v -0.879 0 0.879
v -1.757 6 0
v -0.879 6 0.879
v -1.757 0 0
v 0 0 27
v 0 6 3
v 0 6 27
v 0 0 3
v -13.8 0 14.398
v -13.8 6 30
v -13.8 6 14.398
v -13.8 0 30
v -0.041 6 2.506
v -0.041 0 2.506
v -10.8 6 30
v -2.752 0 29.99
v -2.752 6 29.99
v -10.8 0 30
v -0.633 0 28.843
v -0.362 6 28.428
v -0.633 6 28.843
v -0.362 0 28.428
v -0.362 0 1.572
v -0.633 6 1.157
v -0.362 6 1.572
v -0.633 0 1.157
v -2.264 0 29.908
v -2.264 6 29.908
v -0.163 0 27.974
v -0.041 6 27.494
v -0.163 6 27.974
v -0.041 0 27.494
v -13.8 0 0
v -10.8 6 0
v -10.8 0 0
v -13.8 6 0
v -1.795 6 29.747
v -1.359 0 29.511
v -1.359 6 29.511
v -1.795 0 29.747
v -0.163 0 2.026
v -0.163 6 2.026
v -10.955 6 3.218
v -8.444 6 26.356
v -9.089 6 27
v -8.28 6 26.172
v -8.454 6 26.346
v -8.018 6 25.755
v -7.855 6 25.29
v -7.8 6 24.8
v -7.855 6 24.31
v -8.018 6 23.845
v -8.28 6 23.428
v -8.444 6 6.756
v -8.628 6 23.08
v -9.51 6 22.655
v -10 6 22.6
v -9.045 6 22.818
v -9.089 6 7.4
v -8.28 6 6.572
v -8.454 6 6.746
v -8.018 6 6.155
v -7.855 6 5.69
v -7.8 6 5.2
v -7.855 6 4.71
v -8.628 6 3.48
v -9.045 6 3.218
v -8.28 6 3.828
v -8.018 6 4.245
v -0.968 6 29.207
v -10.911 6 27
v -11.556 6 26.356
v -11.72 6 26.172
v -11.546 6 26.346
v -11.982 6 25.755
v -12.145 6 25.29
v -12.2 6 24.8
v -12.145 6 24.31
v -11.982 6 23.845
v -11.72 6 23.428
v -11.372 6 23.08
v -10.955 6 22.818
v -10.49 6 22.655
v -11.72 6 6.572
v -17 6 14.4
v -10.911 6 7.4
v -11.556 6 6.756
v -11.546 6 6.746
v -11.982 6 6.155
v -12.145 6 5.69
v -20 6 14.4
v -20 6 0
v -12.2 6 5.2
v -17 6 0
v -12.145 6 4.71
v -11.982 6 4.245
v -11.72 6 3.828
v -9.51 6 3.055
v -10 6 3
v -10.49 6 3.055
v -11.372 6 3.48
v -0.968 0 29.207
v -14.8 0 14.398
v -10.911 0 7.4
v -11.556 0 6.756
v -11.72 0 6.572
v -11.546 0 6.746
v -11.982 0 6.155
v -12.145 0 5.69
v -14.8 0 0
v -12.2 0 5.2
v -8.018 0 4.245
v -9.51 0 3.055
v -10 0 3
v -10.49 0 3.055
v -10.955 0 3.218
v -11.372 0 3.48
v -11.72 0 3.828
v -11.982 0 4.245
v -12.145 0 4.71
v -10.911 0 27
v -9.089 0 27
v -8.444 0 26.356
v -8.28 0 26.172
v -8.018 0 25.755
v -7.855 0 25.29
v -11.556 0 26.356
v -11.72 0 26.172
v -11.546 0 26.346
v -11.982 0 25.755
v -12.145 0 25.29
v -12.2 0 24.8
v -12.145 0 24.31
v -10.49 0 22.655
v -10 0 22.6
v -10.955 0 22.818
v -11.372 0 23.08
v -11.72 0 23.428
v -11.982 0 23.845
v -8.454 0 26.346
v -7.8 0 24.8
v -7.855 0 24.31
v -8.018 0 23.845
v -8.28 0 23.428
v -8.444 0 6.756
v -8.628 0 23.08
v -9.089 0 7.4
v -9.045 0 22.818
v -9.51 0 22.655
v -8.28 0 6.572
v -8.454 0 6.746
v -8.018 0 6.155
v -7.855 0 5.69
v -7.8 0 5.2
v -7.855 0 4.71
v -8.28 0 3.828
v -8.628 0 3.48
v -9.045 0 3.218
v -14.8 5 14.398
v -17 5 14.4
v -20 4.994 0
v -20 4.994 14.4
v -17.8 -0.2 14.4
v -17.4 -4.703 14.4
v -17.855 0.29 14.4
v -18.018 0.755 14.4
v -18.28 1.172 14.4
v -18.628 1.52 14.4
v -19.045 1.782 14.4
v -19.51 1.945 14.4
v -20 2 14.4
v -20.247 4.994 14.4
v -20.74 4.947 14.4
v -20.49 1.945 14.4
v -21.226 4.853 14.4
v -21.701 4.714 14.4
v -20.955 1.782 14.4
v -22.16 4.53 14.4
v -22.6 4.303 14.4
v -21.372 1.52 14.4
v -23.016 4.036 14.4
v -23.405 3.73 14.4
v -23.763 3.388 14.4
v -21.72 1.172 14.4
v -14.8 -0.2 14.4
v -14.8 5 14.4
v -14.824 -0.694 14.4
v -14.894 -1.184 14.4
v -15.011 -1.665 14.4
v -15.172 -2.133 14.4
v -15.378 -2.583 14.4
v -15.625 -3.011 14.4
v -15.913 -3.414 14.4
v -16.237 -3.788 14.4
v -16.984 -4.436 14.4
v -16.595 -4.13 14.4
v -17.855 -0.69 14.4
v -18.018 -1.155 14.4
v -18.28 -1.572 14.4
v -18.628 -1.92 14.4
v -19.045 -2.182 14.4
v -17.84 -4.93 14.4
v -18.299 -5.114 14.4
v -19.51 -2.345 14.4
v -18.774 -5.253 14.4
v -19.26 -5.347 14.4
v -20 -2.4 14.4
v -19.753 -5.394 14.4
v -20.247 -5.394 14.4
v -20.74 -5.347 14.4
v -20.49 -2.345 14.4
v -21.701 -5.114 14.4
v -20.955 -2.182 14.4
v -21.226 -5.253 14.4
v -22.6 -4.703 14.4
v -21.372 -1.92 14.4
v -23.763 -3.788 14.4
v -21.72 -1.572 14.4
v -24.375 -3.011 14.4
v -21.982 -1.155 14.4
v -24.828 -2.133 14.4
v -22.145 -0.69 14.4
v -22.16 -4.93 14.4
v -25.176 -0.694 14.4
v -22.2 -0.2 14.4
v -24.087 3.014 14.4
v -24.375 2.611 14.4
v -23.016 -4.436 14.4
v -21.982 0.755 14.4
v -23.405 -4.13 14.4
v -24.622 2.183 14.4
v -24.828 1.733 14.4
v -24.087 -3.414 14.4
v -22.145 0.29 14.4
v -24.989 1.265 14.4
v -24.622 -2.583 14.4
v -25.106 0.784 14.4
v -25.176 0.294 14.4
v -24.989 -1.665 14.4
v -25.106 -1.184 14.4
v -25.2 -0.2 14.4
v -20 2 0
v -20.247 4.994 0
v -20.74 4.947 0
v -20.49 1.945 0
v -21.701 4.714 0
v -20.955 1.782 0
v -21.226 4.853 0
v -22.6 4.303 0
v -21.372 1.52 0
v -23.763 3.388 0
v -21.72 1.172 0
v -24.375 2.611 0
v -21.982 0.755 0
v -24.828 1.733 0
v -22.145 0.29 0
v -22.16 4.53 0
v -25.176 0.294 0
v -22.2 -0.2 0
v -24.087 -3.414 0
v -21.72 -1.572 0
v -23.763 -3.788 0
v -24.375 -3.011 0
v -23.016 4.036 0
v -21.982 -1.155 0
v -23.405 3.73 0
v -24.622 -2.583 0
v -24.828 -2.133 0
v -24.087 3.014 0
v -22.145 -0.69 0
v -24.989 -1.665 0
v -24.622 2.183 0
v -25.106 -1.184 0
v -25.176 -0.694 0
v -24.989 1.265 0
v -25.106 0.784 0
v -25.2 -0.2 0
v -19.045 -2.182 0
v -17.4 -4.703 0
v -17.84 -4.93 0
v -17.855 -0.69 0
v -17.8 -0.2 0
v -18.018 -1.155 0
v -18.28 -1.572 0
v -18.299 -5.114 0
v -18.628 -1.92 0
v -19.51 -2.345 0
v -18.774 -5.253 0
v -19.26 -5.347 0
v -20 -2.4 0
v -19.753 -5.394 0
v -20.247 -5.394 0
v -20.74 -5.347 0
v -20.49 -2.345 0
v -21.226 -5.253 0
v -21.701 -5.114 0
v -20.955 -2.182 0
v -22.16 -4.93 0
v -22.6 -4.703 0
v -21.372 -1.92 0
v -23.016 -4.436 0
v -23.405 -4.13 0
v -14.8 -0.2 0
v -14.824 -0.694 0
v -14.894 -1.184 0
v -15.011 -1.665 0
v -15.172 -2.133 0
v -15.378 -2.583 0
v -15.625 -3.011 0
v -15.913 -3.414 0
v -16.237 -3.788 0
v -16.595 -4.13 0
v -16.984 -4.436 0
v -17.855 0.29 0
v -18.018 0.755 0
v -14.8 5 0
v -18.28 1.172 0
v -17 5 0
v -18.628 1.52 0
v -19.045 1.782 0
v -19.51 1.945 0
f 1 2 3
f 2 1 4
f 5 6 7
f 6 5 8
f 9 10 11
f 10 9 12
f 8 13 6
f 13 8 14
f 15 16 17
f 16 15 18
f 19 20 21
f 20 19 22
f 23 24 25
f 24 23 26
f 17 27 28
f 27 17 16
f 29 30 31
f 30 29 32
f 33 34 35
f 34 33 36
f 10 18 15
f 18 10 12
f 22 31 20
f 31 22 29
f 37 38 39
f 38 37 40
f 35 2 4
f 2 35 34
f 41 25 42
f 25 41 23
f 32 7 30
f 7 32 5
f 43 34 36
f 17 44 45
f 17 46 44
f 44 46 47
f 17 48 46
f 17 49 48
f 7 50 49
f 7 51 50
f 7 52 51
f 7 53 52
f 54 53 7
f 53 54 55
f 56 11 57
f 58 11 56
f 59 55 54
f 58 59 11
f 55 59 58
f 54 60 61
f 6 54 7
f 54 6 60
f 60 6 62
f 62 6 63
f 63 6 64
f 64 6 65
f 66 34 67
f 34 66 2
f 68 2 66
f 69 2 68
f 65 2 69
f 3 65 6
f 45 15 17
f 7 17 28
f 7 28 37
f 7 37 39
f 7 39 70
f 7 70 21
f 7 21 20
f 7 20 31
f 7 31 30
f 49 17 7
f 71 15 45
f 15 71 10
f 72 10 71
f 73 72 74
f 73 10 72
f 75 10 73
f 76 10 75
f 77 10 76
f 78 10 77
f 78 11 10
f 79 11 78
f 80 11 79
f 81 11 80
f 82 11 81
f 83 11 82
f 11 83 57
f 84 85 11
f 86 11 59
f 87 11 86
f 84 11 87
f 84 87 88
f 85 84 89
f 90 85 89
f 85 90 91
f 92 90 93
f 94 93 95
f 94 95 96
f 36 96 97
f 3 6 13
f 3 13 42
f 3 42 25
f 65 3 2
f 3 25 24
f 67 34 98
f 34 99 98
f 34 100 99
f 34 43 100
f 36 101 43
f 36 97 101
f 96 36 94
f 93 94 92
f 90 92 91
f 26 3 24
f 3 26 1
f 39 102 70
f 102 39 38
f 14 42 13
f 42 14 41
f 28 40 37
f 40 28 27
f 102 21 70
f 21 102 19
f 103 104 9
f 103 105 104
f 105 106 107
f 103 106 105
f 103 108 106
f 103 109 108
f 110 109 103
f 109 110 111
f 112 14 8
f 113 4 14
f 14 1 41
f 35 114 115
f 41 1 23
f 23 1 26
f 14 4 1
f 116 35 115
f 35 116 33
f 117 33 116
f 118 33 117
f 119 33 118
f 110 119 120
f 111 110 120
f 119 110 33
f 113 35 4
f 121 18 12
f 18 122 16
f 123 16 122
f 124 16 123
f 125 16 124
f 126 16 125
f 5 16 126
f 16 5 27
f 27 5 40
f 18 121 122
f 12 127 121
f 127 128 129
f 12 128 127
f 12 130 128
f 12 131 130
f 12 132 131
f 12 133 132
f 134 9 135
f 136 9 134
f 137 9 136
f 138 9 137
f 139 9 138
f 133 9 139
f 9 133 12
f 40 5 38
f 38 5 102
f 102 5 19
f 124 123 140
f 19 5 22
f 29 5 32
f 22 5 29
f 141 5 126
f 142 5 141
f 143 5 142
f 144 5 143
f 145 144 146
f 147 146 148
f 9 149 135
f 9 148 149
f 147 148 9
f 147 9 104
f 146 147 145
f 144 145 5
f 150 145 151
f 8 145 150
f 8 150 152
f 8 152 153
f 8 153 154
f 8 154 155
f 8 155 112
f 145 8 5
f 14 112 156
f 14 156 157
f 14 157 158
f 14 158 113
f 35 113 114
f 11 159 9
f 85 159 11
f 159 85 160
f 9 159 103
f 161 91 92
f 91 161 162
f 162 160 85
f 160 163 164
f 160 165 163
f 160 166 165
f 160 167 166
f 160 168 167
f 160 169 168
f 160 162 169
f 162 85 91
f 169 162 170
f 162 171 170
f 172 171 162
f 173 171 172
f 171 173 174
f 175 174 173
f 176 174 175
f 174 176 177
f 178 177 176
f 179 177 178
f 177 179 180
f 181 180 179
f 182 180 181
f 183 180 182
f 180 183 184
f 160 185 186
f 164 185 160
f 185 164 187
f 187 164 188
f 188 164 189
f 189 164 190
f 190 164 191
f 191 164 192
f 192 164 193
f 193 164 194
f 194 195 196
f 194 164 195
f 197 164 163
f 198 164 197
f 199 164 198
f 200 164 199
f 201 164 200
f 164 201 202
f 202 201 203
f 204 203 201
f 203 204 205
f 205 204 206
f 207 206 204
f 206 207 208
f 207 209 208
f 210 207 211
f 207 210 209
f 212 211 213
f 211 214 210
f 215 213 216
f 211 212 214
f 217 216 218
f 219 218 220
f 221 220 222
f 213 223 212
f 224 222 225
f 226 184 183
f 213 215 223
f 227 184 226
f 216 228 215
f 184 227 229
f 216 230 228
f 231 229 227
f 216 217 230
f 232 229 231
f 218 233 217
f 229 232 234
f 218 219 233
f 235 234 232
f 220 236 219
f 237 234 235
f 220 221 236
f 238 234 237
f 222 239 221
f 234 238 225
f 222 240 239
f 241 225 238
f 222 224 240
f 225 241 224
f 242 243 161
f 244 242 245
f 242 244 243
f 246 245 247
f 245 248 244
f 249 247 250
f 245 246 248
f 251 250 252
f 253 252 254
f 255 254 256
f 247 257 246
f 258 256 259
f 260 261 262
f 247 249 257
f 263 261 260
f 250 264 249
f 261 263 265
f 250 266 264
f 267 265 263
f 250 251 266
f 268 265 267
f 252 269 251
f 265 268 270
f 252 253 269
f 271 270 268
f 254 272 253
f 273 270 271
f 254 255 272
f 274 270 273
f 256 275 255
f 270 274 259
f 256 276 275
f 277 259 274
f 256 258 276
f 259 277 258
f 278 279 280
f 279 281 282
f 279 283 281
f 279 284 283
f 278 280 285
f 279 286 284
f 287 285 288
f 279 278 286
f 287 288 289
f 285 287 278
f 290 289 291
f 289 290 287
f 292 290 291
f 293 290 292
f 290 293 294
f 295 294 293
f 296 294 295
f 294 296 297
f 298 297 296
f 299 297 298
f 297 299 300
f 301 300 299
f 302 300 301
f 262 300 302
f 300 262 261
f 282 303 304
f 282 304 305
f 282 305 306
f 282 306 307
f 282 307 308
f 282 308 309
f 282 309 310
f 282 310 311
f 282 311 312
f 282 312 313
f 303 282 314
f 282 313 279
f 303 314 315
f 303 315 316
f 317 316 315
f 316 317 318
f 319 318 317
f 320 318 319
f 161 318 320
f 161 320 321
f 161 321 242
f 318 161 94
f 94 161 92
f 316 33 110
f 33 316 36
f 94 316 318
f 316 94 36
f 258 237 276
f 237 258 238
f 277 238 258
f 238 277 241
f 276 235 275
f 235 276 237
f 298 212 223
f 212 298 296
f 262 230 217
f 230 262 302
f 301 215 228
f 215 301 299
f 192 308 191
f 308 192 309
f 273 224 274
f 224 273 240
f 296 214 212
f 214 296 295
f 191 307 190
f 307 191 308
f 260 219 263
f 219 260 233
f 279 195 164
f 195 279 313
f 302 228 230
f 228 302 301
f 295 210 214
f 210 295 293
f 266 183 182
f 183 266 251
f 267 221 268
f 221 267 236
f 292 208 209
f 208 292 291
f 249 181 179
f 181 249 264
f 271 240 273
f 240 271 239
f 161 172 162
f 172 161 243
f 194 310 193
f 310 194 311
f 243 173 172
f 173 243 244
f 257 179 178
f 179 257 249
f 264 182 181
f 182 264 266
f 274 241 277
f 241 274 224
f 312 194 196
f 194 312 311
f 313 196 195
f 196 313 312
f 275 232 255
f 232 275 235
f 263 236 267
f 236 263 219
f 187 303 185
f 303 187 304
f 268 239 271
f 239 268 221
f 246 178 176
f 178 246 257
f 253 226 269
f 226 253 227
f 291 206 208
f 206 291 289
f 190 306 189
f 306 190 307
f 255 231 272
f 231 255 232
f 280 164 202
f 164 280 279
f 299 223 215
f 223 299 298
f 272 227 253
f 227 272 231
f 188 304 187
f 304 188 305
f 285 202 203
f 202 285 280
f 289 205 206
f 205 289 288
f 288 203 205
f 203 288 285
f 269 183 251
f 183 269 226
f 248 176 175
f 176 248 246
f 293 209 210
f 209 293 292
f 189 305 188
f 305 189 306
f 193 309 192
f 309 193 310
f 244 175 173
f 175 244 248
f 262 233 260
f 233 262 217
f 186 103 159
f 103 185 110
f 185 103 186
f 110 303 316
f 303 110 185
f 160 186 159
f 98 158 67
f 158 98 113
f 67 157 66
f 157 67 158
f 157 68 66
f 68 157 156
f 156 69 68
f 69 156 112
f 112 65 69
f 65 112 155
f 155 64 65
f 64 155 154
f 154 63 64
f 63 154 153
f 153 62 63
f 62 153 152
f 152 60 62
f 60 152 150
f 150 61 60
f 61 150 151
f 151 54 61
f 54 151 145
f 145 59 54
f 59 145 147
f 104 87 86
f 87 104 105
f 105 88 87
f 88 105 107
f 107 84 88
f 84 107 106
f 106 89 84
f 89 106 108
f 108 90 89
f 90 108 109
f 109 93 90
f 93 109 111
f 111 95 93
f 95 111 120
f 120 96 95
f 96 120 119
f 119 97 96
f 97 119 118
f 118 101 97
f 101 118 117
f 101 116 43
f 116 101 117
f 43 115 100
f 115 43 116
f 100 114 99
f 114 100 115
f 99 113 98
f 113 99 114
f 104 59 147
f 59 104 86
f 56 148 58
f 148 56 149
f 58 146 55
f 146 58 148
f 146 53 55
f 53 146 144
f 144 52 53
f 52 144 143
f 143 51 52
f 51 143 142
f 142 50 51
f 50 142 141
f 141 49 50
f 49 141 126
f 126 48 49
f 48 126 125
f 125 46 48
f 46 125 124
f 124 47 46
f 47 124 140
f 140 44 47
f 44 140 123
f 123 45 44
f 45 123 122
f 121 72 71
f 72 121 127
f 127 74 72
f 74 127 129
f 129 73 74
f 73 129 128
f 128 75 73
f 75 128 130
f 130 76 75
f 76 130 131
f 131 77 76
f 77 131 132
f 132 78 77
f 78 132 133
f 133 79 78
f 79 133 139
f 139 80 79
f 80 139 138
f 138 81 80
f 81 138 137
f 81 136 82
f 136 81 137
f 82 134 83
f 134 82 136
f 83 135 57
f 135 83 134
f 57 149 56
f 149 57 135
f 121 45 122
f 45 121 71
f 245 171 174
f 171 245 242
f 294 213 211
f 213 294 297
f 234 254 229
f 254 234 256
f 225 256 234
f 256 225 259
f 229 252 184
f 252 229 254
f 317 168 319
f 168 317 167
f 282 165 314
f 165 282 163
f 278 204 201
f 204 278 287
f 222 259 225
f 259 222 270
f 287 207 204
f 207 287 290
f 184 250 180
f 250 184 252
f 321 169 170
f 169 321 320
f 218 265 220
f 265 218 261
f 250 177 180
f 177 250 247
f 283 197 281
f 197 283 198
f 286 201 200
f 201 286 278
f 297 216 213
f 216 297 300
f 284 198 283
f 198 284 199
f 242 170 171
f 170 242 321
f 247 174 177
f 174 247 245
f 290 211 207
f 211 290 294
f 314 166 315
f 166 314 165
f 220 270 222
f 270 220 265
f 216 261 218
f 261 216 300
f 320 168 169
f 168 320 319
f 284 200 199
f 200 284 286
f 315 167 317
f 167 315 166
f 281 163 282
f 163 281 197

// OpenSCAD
// file: functions.scad
/*******************************************************************

This OpenSCAD code and its rendered 3D model are part of the

	Kühling&Kühling RepRap Industrial 3D Printer


All details, BOM, assembling instructions and latest sources:
	http://kuehlingkuehling.de

Designed and developed by:
	Jonas Kühling <mail@jonaskuehling.de>
	Simon Kühling <mail@simonkuehling.de>

Licensed under:
	Creative Commons Attribution-ShareAlike
	CC BY-SA 3.0
	http://creativecommons.org/licenses/by-sa/3.0/

*******************************************************************/

module teardrop (r=4.5,h=20,alpha=45,teardropcorner=0,fulldrop=0){		// tear drop hole for top-centering
											// use teardropcorner=1 for bottom horizontal corners
	render()
	translate([-h/2,0,0])
		rotate([-270,0+(teardropcorner*180),90])
			difference(){
				linear_extrude(height=h){
					circle(r);
					polygon(points=[[0,0],[r*cos(alpha),r*sin(alpha)],[0,r/sin(alpha)],[-r*cos(alpha),r*sin(alpha)]], paths=[[0,1,2,3]]);
				}
				if(fulldrop==0) 
					translate([0,(r/sin(alpha))/2+r,h/2]) cube([2*r+2,r/sin(alpha),h+2],center=true);
			}
}

//teardrop(4.5,22,fulldrop=true);



module teardropcentering (r=4.5,h=20,alpha=45){				// tear drop hole for top-centering
	centering_offset_factor = 1.1;
	render()
	translate([-h/2,0,0])
		rotate([-270,0,90])
			difference(){
				linear_extrude(height=h){
					circle(r, $fn=24);
					polygon(points=[[0,0],[r*cos(alpha),r*sin(alpha)],[0,r/sin(alpha)],[-r*cos(alpha),r*sin(alpha)]], paths=[[0,1,2,3]]);
				}
				translate([0,(r/sin(alpha))/2+r*centering_offset_factor,h/2]) cube([2*r+2,r/sin(alpha),h+2],center=true);
			}
}

//teardropcentering();



module teardropcentering_half (r=4.5,h=20, bottom=0,alpha=45){				// tear drop hole for top-centering
																// upper half (bottom=0) or bottom half (bottom=1)
	centering_offset_factor = 1.2;
	render()
	translate([-h/2,0,0])
		rotate([-270,0,90])
			difference(){
				linear_extrude(height=h){
					circle(r, $fn=24);
					polygon(points=[[0,0],[r*cos(alpha),r*sin(alpha)],[0,r/sin(alpha)],[-r*cos(alpha),r*sin(alpha)]], paths=[[0,1,2,3]]);
				}
				translate([0,(r/sin(alpha))/2+r*centering_offset_factor,h/2]) cube([2*r+2,r/sin(alpha),h+2],center=true);
				translate([0,-(r*centering_offset_factor)/2-0.5+bottom*(r*centering_offset_factor+1),h/2]) cube([2*r+2,r*centering_offset_factor+1,h+2],center=true);
			}
}

//teardropcentering_half(bottom=0);


module polyhole(d,h){
	n = max(round(2 * d),3);
	cylinder(h = h, r = (d / 2) / cos (180 / n), $fn = n, center=true);
}



module roundcorner(radius,edge_length){
	render()
	translate([0,0,-1])
		difference(){
			translate([-1,-1,0])
				cube(size = [radius+1,radius+1,edge_length+2], center = false);
			translate(v = [radius,radius,-1])
				cylinder(h = edge_length+4, r=radius, center=false,$fs=0.1);
		}
}

//roundcorner(5,5);



module roundcorner_tear(radius,edge_length){
	render()
	difference(){
		translate([-1,-1,-1])
			cube(size = [edge_length+2, radius+1, radius+1], center = false);
		translate([(edge_length+4)/2-2, radius, radius])
			teardrop(radius, edge_length+4,teardropcorner=1);
	}
}

//roundcorner_tear(8,20);


module roundedge_tear(radius){
	render()
	difference(){
		translate([-1,-1,-1])
			cube(size = [radius+1, radius+1, radius+1], center = false);
		translate([radius,radius,radius])
			union(){
				sphere(r=radius, $fs=0.1);
				translate([0,0,-radius])
					cylinder(r1=(radius*sin(45))-(radius-(radius*sin(45))),r2=radius*sin(45),h=(radius-(radius*sin(45))), $fs=0.1);
			}
	}
}

//roundedge_tear(20);



module roundedge(radius){
	render()
	difference(){
		translate([-1,-1,-1])
			cube(size = [radius+1, radius+1, radius+1], center = false);
		translate([radius,radius,radius])
			sphere(r=radius, $fs=0.1);
	}
}

//roundedge(5);


module nut_trap(nut_wrench_size,trap_height,vertical=0, clearance=0.2,center=true){		// M3 wrench size = 5.5
	radius = cornerdiameter(nut_wrench_size+2*clearance) /2;
	rotate([0,vertical*90,0])
		cylinder(h = trap_height, r = radius, center=center, $fn = 6);
}

//nut_trap(5,5,0);

module nut_slot(nut_wrench_size,nut_height, nut_elevation,vertical=0, clearance=0.2){		// M3 wrench size = 5.5
	radius = cornerdiameter(nut_wrench_size+2*clearance) /2;
	slot_height = nut_height+2*clearance;
	slot_width = nut_wrench_size+2*clearance;
	rotate([0,vertical*270,0]){
		cylinder(h = slot_height, r = radius, center=true, $fn = 6);
		translate([0,-slot_width/2,-slot_height/2]) cube([nut_elevation+1,slot_width,slot_height]);
	}
}

//nut_slot(5.5,3,4,1);

function cornerdiameter(wrench_size) =  2* ((wrench_size)/2)/ cos(180/6);
function cornerdiameter_8(wrench_size) =  2* ((wrench_size)/2)/ cos(180/8);
// main file
/*******************************************************************

This OpenSCAD code and its rendered 3D model are part of the

	Kühling&Kühling RepRap Industrial 3D Printer


All details, BOM, assembling instructions and latest sources:
	http://kuehlingkuehling.de

Designed and developed by:
	Jonas Kühling <mail@jonaskuehling.de>
	Simon Kühling <mail@simonkuehling.de>

Licensed under:
	Creative Commons Attribution-ShareAlike
	CC BY-SA 3.0
	http://creativecommons.org/licenses/by-sa/3.0/

*******************************************************************/

include <configuration.scad>


// RENDER FOR PRINTING

// BOTTOM HALF LEFT
//frame_enclosure_door_hinge(top=0);

// TOP HALF LEFT
//translate([2*frame_width,0,frame_enclosure_door_hinge_body_height]) rotate([0,180,0]) // ASSEMBLING TEST
//frame_enclosure_door_hinge(top=1);

// BOTTOM HALF RIGHT
//mirror([1,0,0]) frame_enclosure_door_hinge(top=0);

// TOP HALF RIGHT
mirror([1,0,0]) frame_enclosure_door_hinge(top=1);


module frame_enclosure_door_hinge(top=0){

	difference(){

		// main body
		union(){
			hull(){
				translate([wall,frame_enclosure_door_hinge_body_width/2,wall])
					rotate([180,0,90])
						teardrop(wall,frame_enclosure_door_hinge_body_width);
				translate([wall,frame_enclosure_door_hinge_body_width/2,frame_enclosure_door_hinge_body_height-wall])
					rotate([180,0,90])
						teardrop(wall,frame_enclosure_door_hinge_body_width);
				translate([frame_width-wall_thin-(frame_enclosure_door_hinge_bolt_dia/2+clearance+wall)-wall,0,0])
					cube([wall,frame_enclosure_door_hinge_body_width,frame_enclosure_door_hinge_body_height]);
			}
			hull(){
				translate([wall,frame_enclosure_door_hinge_body_width/2,wall])
					rotate([180,0,90])
						teardrop(wall,frame_enclosure_door_hinge_body_width);
				translate([wall,frame_enclosure_door_hinge_body_width/2,frame_enclosure_door_hinge_body_height/2-frame_enclosure_door_hinge_bolt_washer_thickness/2-clearance-wall])
					rotate([180,0,90])
						teardrop(wall,frame_enclosure_door_hinge_body_width);
				translate([frame_width-wall,0,0])
					cube([wall,frame_enclosure_door_hinge_body_width,frame_enclosure_door_hinge_body_height/2-frame_enclosure_door_hinge_bolt_washer_thickness/2-clearance]);
			}
			translate([frame_width,frame_enclosure_door_hinge_body_width-(frame_enclosure_door_hinge_bolt_dia/2+clearance+wall)-wall_thin,0])
				cylinder(r=frame_enclosure_door_hinge_bolt_dia/2+clearance+wall,h=frame_enclosure_door_hinge_body_height/2-frame_enclosure_door_hinge_bolt_washer_thickness/2-clearance);

				translate([frame_width-(frame_enclosure_door_hinge_bolt_dia/2+clearance+wall),frame_enclosure_door_hinge_body_width-(frame_enclosure_door_hinge_bolt_dia/2+clearance+wall)-wall_thin,0])
					cube([frame_enclosure_door_hinge_bolt_dia/2+clearance+wall,frame_enclosure_door_hinge_bolt_dia/2+clearance+wall,frame_enclosure_door_hinge_body_height/2-frame_enclosure_door_hinge_bolt_washer_thickness/2-clearance]);

		}


		// hinge bolt hole and nut trap
		translate([frame_width,frame_enclosure_door_hinge_body_width-(frame_enclosure_door_hinge_bolt_dia/2+clearance+wall)-wall_thin,-1])
			cylinder(r=frame_enclosure_door_hinge_bolt_dia/2+clearance,h=frame_enclosure_door_hinge_body_height+2);
		if (top == 0)
			translate([frame_width,frame_enclosure_door_hinge_body_width-(frame_enclosure_door_hinge_bolt_dia/2+clearance+wall)-wall_thin,(frame_enclosure_door_hinge_bolt_nut_height+clearance+1)/2+frame_enclosure_door_hinge_body_height/2-frame_enclosure_door_hinge_bolt_washer_thickness/2-clearance-frame_enclosure_door_hinge_bolt_nut_height-clearance])
				nut_trap(frame_enclosure_door_hinge_bolt_nut_wrench, frame_enclosure_door_hinge_bolt_nut_height+clearance+1);

		// frame mount screw holes
		translate([frame_width/2,frame_enclosure_door_hinge_body_width/2,wall+frame_screw_dia/2+clearance])
			rotate([0,0,90])
				teardrop(frame_screw_dia/2+clearance,frame_enclosure_door_hinge_body_width+2);
		translate([frame_width/2,frame_enclosure_door_hinge_body_width/2,frame_enclosure_door_hinge_body_height-(wall+frame_screw_dia/2+clearance)])
			rotate([0,0,90])
				teardrop(frame_screw_dia/2+clearance,frame_enclosure_door_hinge_body_width+2);

			
	}

}
